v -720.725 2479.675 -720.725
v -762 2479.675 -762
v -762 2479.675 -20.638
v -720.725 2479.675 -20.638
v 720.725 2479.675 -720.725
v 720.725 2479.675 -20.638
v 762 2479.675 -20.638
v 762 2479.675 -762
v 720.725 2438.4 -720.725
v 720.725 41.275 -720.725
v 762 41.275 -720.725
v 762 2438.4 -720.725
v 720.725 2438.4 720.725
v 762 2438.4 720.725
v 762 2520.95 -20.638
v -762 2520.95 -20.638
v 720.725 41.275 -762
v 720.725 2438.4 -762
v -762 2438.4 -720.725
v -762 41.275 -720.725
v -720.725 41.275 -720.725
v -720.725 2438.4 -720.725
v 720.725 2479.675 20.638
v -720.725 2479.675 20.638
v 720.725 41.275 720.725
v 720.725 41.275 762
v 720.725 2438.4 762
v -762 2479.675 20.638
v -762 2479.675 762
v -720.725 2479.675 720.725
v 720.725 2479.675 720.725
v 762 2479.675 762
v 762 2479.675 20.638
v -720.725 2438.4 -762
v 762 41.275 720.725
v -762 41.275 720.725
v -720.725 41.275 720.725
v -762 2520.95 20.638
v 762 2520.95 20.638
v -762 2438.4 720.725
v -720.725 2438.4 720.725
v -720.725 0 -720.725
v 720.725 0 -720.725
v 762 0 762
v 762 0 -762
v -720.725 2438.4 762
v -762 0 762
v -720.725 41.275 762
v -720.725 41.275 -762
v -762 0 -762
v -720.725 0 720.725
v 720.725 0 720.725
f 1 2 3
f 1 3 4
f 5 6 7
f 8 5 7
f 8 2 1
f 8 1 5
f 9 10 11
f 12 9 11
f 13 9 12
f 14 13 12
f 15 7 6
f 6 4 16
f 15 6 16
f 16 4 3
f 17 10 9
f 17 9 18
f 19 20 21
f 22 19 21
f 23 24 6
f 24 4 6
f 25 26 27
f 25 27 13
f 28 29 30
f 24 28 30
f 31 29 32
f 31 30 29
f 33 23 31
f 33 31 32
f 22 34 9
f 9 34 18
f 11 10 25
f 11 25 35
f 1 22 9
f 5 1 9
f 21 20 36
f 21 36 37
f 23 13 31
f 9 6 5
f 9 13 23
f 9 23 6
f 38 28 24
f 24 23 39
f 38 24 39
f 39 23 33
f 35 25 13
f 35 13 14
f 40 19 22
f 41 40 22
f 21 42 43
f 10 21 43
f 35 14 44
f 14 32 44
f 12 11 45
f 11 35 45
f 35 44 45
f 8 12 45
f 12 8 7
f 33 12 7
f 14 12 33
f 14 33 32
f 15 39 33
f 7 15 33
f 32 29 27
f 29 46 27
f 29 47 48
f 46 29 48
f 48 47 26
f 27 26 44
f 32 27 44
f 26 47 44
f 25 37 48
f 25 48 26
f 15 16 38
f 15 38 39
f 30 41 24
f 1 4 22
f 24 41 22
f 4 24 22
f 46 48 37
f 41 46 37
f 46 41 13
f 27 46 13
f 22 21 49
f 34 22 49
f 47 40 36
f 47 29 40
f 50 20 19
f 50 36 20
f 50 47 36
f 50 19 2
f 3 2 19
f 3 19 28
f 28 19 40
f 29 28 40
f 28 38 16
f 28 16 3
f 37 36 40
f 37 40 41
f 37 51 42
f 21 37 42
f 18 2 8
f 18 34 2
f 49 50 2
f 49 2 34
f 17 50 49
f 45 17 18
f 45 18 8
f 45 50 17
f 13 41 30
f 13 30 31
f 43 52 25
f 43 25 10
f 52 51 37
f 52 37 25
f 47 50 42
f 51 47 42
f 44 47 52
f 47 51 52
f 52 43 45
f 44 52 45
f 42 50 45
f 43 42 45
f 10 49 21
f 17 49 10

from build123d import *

# Parameters (mm, degrees)
SKETCH2_W           = 1524
SKETCH2_H           = 1524
SKETCH2_W_2         = 1441.45
SKETCH2_H_2         = 1441.45
BOSS_EXTRUDE1_DEPTH = 41.275
SKETCH2_4_W         = 41.275
SKETCH2_4_H         = 41.275
BOSS_EXTRUDE2_DEPTH = 2438.4
BOSS_EXTRUDE3_START = 2438.4
SKETCH2_5_W         = 1524
SKETCH2_5_H         = 1524
SKETCH2_5_W_2       = 1441.45
SKETCH2_5_H_2       = 1441.45
BOSS_EXTRUDE3_DEPTH = 41.275
BOSS_EXTRUDE5_START = 2479.675
SKETCH2_6_W         = 1441.45
SKETCH2_6_H         = 41.275
SKETCH2_6_W_2       = 41.275
BOSS_EXTRUDE5_DEPTH = 41.275


with BuildPart() as part:
    # Sketch2 → Boss-Extrude1 (new body)
    with BuildSketch(Plane(origin=(0, 0, 0), x_dir=(1, 0, 0), z_dir=(0, 1, 0))):
        Rectangle(SKETCH2_W, SKETCH2_H)
        Rectangle(SKETCH2_W_2, SKETCH2_H_2, mode=Mode.SUBTRACT)
    extrude(amount=BOSS_EXTRUDE1_DEPTH)

    # Sketch2<4> → Boss-Extrude2 (add)
    with BuildSketch(Plane(origin=(0, 0, 0), x_dir=(1, 0, 0), z_dir=(0, 1, 0))):
        with Locations((-741.3625, 741.3625)):
            Rectangle(SKETCH2_4_W, SKETCH2_4_H)
        with Locations((741.3625, 741.3625)):
            Rectangle(SKETCH2_4_W, SKETCH2_4_H)
        with Locations((741.3625, -741.3625)):
            Rectangle(SKETCH2_4_W, SKETCH2_4_H)
        with Locations((-741.3625, -741.3625)):
            Rectangle(SKETCH2_4_W, SKETCH2_4_H)
    extrude(amount=BOSS_EXTRUDE2_DEPTH)

    # Sketch2<5> → Boss-Extrude3 (add)
    with BuildSketch(Plane(origin=(0, 0, 0), x_dir=(1, 0, 0), z_dir=(0, 1, 0)).offset(BOSS_EXTRUDE3_START)):
        Rectangle(SKETCH2_5_W, SKETCH2_5_H)
        Rectangle(SKETCH2_5_W_2, SKETCH2_5_H_2, mode=Mode.SUBTRACT)
    extrude(amount=BOSS_EXTRUDE3_DEPTH)

    # Sketch2<6> → Boss-Extrude5 (add)
    with BuildSketch(Plane(origin=(0, 0, 0), x_dir=(1, 0, 0), z_dir=(0, 1, 0)).offset(BOSS_EXTRUDE5_START)):
        Rectangle(SKETCH2_6_W, SKETCH2_6_H)
        with Locations((741.3625, 0)):
            Rectangle(SKETCH2_6_W_2, SKETCH2_6_H)
        with Locations((-741.3625, 0)):
            Rectangle(SKETCH2_6_W_2, SKETCH2_6_H)
    extrude(amount=BOSS_EXTRUDE5_DEPTH)


solid = part.part
